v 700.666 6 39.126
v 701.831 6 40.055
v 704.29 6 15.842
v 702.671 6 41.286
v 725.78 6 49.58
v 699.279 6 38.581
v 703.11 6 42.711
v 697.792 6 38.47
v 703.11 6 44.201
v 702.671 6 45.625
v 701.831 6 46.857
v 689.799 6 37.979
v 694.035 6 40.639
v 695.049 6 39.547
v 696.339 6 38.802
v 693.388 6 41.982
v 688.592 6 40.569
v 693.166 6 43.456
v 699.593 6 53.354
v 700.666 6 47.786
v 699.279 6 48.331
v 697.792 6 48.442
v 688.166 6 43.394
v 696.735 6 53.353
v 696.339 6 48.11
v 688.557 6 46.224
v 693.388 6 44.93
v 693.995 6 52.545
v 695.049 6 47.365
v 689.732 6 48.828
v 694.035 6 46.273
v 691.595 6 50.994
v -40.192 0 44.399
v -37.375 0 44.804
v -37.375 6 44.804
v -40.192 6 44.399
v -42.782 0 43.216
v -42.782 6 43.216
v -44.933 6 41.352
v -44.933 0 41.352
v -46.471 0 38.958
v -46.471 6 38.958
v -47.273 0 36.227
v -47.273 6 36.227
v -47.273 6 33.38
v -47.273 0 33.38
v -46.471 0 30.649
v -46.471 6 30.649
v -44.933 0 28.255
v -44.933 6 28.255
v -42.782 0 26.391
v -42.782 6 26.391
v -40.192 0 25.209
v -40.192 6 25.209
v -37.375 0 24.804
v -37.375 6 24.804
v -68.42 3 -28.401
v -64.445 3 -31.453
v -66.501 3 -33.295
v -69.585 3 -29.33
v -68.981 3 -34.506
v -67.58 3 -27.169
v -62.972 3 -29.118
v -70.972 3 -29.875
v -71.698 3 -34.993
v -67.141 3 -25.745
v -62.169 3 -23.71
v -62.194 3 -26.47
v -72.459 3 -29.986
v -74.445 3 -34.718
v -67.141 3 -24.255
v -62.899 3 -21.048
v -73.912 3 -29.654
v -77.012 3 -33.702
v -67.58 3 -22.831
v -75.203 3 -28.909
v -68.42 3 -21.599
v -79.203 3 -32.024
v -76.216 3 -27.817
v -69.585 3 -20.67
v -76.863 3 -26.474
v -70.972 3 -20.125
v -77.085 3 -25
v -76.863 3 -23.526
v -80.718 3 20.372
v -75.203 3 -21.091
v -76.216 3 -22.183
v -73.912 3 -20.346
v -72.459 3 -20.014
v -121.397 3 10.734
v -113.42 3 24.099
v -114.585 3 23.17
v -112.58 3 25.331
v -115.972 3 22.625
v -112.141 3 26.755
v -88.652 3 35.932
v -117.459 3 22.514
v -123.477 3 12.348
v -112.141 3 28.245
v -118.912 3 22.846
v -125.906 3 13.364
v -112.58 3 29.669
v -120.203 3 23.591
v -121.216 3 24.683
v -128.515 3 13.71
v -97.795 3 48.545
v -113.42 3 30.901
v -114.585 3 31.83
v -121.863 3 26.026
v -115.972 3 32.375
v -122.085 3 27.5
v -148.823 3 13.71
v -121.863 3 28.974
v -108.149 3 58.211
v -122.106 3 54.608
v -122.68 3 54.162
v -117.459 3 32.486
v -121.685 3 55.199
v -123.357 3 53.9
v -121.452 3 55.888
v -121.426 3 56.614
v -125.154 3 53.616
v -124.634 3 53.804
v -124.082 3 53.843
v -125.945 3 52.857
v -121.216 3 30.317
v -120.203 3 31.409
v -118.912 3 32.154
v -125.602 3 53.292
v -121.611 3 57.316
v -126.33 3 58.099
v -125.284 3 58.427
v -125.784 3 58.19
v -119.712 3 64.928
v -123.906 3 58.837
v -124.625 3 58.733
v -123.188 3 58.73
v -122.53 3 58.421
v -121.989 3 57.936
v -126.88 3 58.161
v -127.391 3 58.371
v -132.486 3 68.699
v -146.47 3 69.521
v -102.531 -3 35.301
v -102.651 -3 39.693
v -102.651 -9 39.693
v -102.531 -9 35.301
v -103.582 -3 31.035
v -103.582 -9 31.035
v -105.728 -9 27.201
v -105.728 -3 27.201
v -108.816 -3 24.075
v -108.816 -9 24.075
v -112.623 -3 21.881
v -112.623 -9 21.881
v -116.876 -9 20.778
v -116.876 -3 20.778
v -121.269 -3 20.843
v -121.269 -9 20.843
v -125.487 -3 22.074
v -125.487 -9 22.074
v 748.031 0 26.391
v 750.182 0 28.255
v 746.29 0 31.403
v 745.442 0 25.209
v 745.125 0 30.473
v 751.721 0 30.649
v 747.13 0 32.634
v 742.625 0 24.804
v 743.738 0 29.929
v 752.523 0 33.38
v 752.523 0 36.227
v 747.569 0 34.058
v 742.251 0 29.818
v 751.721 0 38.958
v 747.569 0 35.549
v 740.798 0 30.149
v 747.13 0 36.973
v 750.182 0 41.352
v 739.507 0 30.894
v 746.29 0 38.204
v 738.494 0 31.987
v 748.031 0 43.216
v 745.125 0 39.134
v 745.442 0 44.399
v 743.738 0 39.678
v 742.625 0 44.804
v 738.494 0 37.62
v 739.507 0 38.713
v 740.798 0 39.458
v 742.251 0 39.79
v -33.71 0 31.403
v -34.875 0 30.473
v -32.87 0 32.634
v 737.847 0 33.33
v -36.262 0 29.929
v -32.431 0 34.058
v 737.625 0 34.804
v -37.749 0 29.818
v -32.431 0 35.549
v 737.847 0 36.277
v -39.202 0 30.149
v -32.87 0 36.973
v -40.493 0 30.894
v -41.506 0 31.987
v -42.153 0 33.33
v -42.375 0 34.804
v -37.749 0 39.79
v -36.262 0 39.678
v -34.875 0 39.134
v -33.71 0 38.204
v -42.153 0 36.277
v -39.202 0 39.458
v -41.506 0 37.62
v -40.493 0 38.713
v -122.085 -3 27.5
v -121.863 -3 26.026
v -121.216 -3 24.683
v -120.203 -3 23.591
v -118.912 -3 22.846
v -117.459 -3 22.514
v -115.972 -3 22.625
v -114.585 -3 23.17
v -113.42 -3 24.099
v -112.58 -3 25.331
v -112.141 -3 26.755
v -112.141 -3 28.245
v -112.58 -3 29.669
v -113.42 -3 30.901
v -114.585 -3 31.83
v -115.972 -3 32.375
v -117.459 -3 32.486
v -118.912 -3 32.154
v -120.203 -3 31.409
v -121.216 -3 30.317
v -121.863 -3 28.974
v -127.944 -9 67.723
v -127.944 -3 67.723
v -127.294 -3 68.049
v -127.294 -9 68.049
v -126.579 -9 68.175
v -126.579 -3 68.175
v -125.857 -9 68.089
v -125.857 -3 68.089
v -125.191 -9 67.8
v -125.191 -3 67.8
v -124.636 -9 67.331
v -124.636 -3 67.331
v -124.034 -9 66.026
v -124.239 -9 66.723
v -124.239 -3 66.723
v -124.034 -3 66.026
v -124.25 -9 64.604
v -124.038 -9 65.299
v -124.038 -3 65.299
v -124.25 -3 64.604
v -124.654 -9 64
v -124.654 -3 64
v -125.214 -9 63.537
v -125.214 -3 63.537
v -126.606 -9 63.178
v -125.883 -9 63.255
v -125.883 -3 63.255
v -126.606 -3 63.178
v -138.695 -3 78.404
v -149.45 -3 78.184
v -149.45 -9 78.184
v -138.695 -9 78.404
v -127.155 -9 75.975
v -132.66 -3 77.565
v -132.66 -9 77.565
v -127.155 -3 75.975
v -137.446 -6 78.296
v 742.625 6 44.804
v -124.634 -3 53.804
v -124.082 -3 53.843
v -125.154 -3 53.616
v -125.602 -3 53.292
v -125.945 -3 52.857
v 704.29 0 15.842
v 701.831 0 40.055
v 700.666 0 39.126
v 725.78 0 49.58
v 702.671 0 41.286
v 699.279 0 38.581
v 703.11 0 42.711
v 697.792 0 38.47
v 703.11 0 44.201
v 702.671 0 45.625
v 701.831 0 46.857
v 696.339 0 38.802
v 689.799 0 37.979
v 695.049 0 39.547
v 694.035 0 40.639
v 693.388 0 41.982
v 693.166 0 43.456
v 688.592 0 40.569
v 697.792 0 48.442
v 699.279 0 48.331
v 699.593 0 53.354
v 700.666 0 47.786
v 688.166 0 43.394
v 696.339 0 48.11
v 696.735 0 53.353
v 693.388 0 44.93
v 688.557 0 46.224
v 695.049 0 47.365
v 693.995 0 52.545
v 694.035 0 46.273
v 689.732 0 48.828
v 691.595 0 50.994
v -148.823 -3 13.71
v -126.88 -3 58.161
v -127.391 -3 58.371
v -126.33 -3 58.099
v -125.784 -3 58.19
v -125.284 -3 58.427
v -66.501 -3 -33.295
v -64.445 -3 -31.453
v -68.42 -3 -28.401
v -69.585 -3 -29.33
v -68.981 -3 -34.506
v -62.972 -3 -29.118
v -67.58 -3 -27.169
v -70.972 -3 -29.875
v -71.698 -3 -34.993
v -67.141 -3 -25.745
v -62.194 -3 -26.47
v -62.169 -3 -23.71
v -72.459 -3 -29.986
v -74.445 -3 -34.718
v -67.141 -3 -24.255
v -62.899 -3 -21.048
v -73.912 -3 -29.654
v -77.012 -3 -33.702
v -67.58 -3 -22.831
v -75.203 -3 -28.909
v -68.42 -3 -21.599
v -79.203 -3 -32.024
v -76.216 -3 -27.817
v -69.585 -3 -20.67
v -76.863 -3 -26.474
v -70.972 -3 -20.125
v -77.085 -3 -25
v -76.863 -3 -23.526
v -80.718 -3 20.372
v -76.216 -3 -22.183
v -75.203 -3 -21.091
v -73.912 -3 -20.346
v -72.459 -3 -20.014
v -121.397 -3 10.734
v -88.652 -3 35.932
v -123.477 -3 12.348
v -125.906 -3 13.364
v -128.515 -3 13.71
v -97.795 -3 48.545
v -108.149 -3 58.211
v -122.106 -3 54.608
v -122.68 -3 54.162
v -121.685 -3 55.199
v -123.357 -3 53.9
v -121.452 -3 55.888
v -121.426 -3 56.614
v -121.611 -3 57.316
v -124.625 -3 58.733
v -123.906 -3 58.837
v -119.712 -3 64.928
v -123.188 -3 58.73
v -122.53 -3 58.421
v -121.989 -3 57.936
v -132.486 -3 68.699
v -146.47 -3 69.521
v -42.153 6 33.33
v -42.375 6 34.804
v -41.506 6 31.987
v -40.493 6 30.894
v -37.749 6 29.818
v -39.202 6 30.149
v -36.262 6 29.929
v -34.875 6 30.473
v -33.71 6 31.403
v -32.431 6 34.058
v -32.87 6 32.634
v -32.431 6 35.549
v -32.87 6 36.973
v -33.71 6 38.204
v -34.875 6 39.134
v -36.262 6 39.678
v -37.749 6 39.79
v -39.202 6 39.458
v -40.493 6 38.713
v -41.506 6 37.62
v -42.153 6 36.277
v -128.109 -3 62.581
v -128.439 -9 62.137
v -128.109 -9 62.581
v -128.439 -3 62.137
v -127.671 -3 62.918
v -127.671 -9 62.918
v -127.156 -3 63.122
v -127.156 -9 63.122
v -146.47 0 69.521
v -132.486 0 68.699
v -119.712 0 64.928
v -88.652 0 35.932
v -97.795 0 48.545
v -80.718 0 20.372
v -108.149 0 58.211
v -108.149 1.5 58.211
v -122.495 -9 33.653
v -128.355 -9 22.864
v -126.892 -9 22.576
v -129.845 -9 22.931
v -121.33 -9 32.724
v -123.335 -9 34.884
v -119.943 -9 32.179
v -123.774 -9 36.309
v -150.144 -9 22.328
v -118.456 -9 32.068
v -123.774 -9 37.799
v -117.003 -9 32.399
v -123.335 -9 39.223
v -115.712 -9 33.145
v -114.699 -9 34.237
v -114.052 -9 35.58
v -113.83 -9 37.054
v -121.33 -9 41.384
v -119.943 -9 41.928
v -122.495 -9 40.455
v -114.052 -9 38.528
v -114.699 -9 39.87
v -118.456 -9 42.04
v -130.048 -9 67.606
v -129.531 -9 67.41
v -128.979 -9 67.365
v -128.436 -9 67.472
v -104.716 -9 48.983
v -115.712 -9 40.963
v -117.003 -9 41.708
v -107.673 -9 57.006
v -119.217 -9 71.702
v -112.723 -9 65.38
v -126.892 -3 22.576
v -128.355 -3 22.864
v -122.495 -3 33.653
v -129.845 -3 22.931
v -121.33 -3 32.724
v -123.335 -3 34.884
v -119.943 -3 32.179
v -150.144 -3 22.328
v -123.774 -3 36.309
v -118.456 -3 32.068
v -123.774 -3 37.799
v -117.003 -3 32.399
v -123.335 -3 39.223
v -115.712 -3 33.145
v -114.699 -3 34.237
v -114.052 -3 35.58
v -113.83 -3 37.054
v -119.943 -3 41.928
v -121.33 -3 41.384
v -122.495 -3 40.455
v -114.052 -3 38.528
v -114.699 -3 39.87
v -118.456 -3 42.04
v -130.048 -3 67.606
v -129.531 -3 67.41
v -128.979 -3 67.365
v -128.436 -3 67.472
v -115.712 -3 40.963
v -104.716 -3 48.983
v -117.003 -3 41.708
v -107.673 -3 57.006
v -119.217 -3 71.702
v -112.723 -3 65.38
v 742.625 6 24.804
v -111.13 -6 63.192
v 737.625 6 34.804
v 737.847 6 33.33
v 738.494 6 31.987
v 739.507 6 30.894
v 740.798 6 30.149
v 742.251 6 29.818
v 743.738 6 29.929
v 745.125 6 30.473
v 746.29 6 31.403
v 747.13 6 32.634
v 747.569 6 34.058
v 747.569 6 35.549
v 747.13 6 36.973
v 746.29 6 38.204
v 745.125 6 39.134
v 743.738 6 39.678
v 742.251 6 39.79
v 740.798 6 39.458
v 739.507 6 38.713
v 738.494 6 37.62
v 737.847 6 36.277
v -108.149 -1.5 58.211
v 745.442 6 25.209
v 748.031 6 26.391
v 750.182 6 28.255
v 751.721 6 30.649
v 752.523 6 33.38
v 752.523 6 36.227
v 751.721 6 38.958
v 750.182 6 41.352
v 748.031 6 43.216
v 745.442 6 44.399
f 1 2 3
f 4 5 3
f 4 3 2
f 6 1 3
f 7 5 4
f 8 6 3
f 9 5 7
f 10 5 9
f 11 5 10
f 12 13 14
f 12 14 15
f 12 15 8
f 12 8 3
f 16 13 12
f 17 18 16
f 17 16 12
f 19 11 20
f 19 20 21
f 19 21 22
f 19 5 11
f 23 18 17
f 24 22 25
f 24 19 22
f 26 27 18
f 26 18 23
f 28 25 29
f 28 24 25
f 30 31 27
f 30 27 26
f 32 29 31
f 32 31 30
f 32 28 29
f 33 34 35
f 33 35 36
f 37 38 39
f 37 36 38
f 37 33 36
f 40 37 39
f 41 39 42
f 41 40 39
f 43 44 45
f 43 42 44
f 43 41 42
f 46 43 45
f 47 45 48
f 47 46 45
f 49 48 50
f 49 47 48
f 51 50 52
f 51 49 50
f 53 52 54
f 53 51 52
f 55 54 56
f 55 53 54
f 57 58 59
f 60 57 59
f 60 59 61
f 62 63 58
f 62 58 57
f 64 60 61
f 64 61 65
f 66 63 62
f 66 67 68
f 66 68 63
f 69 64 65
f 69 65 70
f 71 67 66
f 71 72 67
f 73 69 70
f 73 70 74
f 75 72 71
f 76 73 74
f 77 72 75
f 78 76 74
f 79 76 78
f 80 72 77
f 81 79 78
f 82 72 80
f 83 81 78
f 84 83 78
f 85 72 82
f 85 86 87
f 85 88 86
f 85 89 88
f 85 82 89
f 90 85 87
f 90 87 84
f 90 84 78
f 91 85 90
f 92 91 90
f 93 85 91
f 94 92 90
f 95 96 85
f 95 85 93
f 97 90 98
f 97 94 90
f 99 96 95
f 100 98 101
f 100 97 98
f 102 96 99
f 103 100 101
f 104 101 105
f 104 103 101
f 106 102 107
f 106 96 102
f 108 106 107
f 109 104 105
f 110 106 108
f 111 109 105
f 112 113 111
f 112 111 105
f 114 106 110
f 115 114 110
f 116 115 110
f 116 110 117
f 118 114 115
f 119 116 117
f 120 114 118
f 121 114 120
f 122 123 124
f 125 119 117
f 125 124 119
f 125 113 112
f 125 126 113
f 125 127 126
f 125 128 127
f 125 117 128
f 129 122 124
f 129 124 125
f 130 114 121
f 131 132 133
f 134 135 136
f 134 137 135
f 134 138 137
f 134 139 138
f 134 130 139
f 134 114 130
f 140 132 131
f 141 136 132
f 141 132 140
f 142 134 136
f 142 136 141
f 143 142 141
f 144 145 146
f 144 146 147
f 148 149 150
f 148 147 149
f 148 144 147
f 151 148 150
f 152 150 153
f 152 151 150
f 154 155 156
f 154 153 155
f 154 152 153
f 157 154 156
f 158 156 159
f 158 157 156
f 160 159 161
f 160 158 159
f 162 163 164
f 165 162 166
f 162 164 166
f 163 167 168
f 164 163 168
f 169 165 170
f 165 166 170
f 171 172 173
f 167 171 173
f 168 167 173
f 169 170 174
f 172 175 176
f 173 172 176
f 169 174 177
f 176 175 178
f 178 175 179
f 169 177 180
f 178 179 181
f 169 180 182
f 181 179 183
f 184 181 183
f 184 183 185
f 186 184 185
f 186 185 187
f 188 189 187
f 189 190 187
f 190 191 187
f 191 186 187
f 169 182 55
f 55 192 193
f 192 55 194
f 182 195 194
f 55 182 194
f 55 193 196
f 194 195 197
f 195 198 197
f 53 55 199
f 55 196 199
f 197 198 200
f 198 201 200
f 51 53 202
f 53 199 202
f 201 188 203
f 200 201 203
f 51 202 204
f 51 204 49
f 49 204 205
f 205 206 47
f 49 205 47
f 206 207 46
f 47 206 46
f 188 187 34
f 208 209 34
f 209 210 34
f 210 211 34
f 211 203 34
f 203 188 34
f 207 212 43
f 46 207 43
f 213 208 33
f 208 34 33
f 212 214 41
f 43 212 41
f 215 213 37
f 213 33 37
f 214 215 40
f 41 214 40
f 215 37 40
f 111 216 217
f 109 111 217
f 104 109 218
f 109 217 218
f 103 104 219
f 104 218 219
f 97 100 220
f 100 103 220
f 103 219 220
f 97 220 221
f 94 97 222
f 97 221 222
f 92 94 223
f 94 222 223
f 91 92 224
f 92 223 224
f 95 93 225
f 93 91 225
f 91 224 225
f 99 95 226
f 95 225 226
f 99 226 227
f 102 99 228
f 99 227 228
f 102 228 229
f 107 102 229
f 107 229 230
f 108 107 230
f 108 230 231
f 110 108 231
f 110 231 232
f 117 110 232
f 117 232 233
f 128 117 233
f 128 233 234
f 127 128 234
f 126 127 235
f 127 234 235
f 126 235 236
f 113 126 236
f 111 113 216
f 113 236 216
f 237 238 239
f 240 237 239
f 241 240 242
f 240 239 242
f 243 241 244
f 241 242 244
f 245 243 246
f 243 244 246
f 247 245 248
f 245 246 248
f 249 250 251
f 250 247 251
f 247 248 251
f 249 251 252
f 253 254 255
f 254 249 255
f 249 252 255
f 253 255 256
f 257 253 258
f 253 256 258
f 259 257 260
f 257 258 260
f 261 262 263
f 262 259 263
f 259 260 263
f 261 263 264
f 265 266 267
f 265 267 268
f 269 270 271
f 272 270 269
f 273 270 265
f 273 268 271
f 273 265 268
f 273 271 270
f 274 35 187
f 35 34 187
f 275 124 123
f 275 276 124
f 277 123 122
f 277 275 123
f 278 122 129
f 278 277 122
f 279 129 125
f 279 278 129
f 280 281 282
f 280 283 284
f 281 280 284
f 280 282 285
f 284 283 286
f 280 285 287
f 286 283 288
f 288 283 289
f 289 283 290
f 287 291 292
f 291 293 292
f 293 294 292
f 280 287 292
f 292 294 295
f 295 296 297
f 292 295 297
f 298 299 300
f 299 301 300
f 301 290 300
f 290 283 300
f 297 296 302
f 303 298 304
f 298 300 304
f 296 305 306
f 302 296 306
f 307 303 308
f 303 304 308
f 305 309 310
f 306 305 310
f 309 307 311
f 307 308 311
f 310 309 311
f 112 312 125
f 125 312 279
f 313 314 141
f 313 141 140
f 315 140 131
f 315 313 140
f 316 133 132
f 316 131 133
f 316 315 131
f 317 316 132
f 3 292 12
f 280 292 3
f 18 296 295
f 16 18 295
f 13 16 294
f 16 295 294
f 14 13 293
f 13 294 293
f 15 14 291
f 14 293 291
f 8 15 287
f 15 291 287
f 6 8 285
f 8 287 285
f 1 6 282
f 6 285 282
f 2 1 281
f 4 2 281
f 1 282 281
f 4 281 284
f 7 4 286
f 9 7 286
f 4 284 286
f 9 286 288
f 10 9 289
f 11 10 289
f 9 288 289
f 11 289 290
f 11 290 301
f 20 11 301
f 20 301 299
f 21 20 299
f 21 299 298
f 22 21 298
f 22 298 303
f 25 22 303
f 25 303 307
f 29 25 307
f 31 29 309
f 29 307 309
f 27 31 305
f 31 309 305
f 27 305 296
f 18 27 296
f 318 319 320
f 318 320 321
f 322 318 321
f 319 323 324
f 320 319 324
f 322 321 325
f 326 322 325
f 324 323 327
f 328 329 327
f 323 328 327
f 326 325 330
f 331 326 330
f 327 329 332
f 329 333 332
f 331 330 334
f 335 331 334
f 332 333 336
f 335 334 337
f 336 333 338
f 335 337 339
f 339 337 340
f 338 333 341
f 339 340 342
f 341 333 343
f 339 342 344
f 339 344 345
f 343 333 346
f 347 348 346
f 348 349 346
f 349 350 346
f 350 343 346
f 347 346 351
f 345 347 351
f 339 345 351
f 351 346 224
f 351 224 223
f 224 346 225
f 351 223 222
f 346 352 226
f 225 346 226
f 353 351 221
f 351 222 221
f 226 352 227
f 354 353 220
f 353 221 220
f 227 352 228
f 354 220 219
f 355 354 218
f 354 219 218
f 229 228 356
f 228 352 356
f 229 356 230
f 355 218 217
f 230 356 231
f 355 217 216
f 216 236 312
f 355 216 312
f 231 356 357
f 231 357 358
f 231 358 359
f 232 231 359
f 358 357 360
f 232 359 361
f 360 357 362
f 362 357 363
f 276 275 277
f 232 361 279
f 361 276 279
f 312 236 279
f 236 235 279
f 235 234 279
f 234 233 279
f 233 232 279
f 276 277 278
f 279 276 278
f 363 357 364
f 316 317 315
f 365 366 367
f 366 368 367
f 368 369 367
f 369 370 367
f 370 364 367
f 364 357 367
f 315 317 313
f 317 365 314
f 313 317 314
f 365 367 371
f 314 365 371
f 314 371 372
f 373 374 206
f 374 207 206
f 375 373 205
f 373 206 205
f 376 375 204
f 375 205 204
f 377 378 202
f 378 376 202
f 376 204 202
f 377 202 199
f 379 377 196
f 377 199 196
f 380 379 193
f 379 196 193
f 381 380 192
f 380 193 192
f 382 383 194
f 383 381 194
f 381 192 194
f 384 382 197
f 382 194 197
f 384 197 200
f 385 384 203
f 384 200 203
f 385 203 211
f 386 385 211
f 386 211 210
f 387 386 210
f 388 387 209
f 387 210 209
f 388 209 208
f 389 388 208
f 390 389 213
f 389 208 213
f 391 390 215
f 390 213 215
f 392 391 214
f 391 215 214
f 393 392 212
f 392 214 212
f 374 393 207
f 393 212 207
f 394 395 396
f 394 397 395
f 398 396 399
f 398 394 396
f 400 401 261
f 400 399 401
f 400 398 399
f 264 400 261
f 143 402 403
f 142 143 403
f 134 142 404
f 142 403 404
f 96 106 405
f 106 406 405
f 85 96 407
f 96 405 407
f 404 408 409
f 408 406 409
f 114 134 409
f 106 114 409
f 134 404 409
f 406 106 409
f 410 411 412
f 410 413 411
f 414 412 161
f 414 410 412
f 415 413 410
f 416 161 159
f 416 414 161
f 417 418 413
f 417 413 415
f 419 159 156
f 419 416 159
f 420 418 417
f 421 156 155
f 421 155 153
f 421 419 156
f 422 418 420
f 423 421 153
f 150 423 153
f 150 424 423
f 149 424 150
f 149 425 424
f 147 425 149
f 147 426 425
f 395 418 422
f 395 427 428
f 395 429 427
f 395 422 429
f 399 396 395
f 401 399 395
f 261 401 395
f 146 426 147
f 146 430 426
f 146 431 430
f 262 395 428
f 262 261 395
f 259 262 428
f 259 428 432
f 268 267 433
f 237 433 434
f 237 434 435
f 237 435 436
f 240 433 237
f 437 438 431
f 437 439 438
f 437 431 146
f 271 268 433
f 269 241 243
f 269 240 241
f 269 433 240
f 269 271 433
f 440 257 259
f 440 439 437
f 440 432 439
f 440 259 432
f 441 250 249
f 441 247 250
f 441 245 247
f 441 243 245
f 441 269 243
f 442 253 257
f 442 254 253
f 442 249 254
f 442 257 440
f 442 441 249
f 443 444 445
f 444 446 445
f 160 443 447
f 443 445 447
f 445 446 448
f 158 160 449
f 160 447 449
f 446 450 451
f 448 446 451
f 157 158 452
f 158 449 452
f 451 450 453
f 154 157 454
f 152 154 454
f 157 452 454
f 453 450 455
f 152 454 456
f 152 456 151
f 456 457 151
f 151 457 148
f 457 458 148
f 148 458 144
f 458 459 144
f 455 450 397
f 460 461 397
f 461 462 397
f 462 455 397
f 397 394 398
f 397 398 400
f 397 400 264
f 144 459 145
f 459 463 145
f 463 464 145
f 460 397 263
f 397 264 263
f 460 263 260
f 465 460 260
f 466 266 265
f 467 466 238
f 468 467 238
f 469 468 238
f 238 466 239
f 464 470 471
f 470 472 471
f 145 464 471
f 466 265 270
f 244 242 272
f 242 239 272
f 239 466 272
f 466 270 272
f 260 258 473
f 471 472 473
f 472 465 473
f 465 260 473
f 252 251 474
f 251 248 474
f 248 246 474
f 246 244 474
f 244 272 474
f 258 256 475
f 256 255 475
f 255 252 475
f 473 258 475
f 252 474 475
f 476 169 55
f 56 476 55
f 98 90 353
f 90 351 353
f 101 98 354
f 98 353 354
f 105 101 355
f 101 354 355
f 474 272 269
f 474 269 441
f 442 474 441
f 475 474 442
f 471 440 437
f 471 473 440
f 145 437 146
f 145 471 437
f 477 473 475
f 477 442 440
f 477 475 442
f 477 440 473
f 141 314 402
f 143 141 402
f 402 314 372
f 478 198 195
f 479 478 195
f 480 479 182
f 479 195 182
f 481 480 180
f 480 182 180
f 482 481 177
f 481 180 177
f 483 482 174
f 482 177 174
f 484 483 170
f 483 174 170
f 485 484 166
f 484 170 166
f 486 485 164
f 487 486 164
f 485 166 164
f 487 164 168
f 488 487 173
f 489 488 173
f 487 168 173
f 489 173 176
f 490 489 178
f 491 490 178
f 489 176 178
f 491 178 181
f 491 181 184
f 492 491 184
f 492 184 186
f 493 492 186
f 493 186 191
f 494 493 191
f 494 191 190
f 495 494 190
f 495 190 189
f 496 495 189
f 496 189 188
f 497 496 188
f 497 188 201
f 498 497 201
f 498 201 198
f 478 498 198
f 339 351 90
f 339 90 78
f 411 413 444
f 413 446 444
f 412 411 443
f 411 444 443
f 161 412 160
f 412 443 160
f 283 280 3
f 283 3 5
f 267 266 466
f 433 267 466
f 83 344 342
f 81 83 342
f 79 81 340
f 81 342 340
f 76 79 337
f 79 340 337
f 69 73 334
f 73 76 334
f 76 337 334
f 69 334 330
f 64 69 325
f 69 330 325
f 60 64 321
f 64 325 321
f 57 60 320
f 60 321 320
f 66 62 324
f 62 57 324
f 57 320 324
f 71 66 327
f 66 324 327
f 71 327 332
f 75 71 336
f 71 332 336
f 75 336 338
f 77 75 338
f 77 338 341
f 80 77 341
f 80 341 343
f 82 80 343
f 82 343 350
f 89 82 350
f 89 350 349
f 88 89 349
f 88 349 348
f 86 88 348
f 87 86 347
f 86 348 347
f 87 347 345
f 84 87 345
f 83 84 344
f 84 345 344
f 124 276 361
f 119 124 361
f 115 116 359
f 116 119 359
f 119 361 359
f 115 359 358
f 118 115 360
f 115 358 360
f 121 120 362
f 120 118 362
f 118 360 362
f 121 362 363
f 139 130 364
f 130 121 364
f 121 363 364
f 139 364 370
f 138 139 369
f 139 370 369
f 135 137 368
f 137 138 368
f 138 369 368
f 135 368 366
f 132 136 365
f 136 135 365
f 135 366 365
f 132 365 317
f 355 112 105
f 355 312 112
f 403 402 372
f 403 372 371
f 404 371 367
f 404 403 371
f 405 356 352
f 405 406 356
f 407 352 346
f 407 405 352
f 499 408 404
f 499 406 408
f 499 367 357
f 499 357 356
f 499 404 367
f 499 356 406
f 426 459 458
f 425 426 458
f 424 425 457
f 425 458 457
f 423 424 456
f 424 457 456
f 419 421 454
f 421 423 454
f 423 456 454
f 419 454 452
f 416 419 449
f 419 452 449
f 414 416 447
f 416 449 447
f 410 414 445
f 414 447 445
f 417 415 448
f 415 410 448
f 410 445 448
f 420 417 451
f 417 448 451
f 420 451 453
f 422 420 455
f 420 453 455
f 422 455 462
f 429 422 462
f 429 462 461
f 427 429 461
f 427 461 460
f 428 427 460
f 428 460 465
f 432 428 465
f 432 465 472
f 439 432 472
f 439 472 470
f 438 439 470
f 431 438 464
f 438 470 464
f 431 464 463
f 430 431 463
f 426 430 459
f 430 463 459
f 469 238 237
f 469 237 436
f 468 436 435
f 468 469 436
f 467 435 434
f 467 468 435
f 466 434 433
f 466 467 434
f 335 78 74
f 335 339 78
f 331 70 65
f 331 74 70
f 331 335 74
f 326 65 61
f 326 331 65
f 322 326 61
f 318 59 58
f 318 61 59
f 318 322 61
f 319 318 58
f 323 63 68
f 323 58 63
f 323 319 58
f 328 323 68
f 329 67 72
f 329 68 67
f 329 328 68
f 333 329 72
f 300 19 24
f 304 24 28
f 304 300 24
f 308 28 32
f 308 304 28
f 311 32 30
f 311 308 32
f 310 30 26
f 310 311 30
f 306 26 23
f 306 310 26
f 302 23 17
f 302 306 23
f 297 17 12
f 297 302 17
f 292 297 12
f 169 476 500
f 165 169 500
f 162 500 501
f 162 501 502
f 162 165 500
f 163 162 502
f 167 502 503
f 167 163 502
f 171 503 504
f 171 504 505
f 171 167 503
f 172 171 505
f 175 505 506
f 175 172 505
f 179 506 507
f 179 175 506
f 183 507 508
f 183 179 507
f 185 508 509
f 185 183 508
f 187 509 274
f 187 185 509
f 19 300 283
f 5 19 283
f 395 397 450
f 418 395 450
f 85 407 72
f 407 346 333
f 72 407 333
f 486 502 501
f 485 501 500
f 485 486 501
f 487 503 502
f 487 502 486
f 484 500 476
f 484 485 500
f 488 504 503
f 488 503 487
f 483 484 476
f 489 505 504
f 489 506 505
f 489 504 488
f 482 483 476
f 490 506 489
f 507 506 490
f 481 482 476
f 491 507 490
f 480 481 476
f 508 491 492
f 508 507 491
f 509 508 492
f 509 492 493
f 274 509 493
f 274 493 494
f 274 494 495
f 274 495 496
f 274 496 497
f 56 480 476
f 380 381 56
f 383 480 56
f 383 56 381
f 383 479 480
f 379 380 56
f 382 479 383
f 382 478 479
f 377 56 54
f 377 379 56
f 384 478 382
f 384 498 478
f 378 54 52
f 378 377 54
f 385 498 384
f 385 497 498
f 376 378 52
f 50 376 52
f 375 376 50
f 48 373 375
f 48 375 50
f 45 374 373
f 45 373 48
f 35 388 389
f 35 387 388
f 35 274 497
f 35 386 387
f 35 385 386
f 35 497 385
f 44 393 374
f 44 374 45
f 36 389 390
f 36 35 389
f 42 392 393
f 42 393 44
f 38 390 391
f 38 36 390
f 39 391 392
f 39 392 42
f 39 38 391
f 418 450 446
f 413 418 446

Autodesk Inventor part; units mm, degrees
ref_plane "YZ Plane" through (0, 0, 0) normal (1, 0, 0) x (0, 1, 0)
ref_plane "XZ Plane" through (0, 0, 0) normal (0, 1, 0) x (-1, 0, 0)
ref_plane "XY Plane" through (0, 0, 0) normal (0, 0, 1) x (1, 0, 0)
sketch "Sketch1" plane through (0, 0, 0) normal (0, 1, 0) x (-1, 0, 0)
  line L0 (-32.0851, 0) -> (32.0851, 0)
  circle A0 centre (-707.9149, -25) radius 9.525 construction
  circle A1 centre (-708.1649, 701) radius 16.5354 construction
  line L1 (-708.1649, 701) -> (-707.9149, -25) construction
  line L2 (-707.9149, -25) -> (-1097.9553, 587.3271)
  circle A2 centre (-707.9149, -25) radius 726 construction
  line L3 (-729.0005, -38.4311) -> (-1119.041, 573.896) construction
  line L4 (-1119.041, 573.896) -> (-1076.8697, 600.7583) construction
  line L5 (-1076.8697, 600.7583) -> (-686.8292, -11.5689) construction
  line L6 (-686.8292, -11.5689) -> (-729.0005, -38.4311) construction
  line L7 (-729.0005, -38.4311) -> (-1076.8697, 600.7583) construction
  line L8 (-1119.041, 573.896) -> (-686.8292, -11.5689) construction
  line L9 (-1433.9063, -50.25) -> (-1433.9235, -0.25) construction
  line L10 (-707.9235, 0) -> (-707.9063, -50) construction
  circle A3 centre (-707.9149, -25) radius 52.5 construction
  line L11 (-689.7993, 37.979) -> (-704.2897, 15.8425)
  line L12 (-699.5926, 53.3536) -> (-725.7796, 49.5795)
  arc A4 (-689.7993, 37.979) -> (-699.5926, 53.3536) centre (-698.1661, 43.4559) ccw
  circle A5 centre (-698.1661, 43.4559) radius 5
  line L13 (-698.1661, 43.4559) -> (-736.1203, 19.2799) construction
  circle A6 centre (72.0851, -25) radius 5
  arc A7 (62.8991, -21.0481) -> (80.3122, -19.3154) centre (72.0851, -25) ccw
  circle A8 centre (72.0851, -25) radius 87.2511 construction
  line L14 (176.9747, 84.4532) -> (127.3309, 55.4404) construction
  circle A9 centre (72.0851, -25) radius 151.5976 construction
  circle A10 centre (-707.9149, -25) radius 69.1466 construction
  line L15 (-707.9387, 44.1466) -> (-777.0615, -25) construction
  line L16 (80.7183, 20.3721) -> (62.8991, -21.0481)
  line L17 (-707.933, 27.5) -> (-662.933, 27.5155) construction
  circle A11 centre (72.0851, -25) radius 52.5 construction
  circle A12 centre (72.0851, -25) radius 69.1466 construction
  line L18 (72.0851, 27.5) -> (117.0851, 27.5) construction
  circle A13 centre (117.0851, 27.5) radius 5
  arc A14 (125.2839, 58.4267) -> (124.0817, 53.8433) centre (123.911, 56.3374) ccw
  line L19 (148.823, 13.7104) -> (125.945, 52.8571)
  arc A15 (125.2839, 58.4267) -> (127.3914, 58.3714) centre (126.3822, 60.0981) ccw
  arc A16 (125.945, 52.8571) -> (124.0817, 53.8433) centre (124.2183, 51.8479) ccw
  line L20 (-704.2897, 15.8425) -> (-725.7796, 49.5795)
  line L21 (148.823, 13.7104) -> (128.5153, 13.7104)
  line L22 (121.3974, 10.7344) -> (79.203, -32.024)
  arc A17 (128.5153, 13.7104) -> (121.3974, 10.7344) centre (128.5153, 3.7104) ccw
  line L23 (123.911, 56.3374) -> (175.7133, 86.6116) construction
  line L24 (154.1852, 4.5352) -> (123.911, 56.3374) construction
  line L25 (117.0851, 27.5) -> (-662.933, 27.5155) construction
  line L26 (117.0853, 37.5) -> (-662.9328, 37.5155) construction
  line L27 (-662.9332, 17.5155) -> (117.0849, 17.5) construction
  arc A18 (117.0849, 17.5) -> (117.0853, 37.5) centre (117.0851, 27.5) ccw construction
  arc A19 (-662.9328, 37.5155) -> (-662.9332, 17.5155) centre (-662.933, 27.5155) ccw construction
  line L28 (-732.9149, -5) -> (367.0851, -5) construction
  line L29 (-732.9149, 0) -> (367.0851, 0) construction
  line L30 (-742.6249, -64.3887) -> (-742.6249, 34.8036) construction
  line L31 (37.3751, 14.3887) -> (37.3751, 34.8036) construction
  line L32 (37.3751, 34.8036) -> (-742.6249, 34.8036) construction
  line L33 (37.3751, 44.8036) -> (-742.6249, 44.8036)
  line L34 (-742.6249, 24.8036) -> (37.3751, 24.8036)
  arc A20 (37.3751, 24.8036) -> (37.3751, 44.8036) centre (37.3751, 34.8036) ccw
  arc A21 (-742.6249, 44.8036) -> (-742.6249, 24.8036) centre (-742.6249, 34.8036) ccw
  line L35 (146.4702, 69.5214) -> (102.7028, 71.4745) construction
  line L36 (102.7028, 71.4745) -> (80.7183, 20.3721) construction
  spline S0 degree 2 poles (146.4702, 69.5214) (102.7028, 71.4745) (80.7183, 20.3721) knots 1 1 1 2 2 2
  line L37 (127.3914, 58.3714) -> (146.4702, 69.5214)
  circle A22 centre (37.3751, 34.8036) radius 5
  circle A23 centre (-742.6249, 34.8036) radius 5
  point P0 (0, 0)
  point P1 (0, 0)
  point P2 (-902.9351, 281.1636)
  point P3 (-707.9149, -25)
  point P4 (126.0694, 57.5988)
  point P5 (130.1781, 60)
  point P6 (125.1724, 54.179)
  point P7 (132.8635, 61.5694)
  point P8 (-272.9239, 27.5077)
  point P9 (-352.6249, 34.8036)
  dimension "d8" = 50
  dimension "d9" = 50
  dimension "d10" = 105
  dimension "d13" = 10
  dimension "d14" = 20
  dimension "d15" = 20
  dimension "d16" = 40
  dimension "d17" = 10
  dimension "d18" = 780
  dimension "d19" = 20
  dimension "d23" = 45
  dimension "d24" = 10
  dimension "d26" = 5
  dimension "d27" = 2
  dimension "d28" = 45
  dimension "d31" = 69.1466
  dimension "d32" = 10
  dimension "d33" = 20
  dimension "d34" = 20
  dimension "d35" = 780
  dimension "d36" = 10
  dimension "d37" = 10
extrude "Extrusion1" add sketch "Sketch1" along normal mid plane 6 contours L16 S0 L37 A15 A14 A16 L19 L21 A17 L22 A7
extrude "Extrusion3" add sketch "Sketch1" along normal blind 6 separate body contours L34 L11 L20 | L20 L33 A5 A4 L11 L34 | L20 L12 A4 L33 A5
extrude "Extrusion4" add sketch "Sketch1" along normal blind 6 separate body contours L34 A21 L2 A23 | L2 A23 A21 L33 L20 L34 | L20 L33 A5 A4 L11 L34 | L11 A4 L33 A20 L34 | L33 A5 picked at (-699.4866, 42.0247)
sketch "Sketch3" plane through (0, -3, 0) normal (0, -1, 0) x (1, 0, 0)
  circle A0 centre (-118.8299, 37.0538) radius 5 projected
  circle A1 centre (-72.2906, -14.0866) radius 5 projected
  line L0 (-63.226, -9.8637) -> (-82.2675, 31.0091) projected
  spline S0 degree 2 poles (-82.2675, 31.0091) (-105.7599, 81.436) (-149.45, 78.184) knots 1 1 1 2 2 2 projected
  line L1 (-149.45, 78.184) -> (-130.0484, 67.6055) projected
  arc A2 (-130.0484, 67.6055) -> (-127.9435, 67.7234) centre (-129.091, 69.3615) ccw projected
  arc A3 (-126.6058, 63.1776) -> (-127.9435, 67.7234) centre (-126.5092, 65.6758) ccw projected
  arc A4 (-126.6058, 63.1776) -> (-128.4389, 62.1366) centre (-126.683, 61.1791) ccw projected
  line L2 (-128.4389, 62.1366) -> (-150.1443, 22.3278) projected
  line L3 (-150.1443, 22.3278) -> (-129.8455, 22.9309) projected
  arc A5 (-122.6424, 20.1675) -> (-129.8455, 22.9309) centre (-129.5485, 12.9353) ccw projected
  line L4 (-122.6424, 20.1675) -> (-79.1967, -21.3189) projected
  arc A6 (-79.1967, -21.3189) -> (-63.226, -9.8637) centre (-72.2906, -14.0866) ccw projected
  arc A7 (-125.4874, 22.0735) -> (-102.6507, 39.693) centre (-118.8299, 37.0538) ccw
  line L5 (-149.45, 78.184) -> (-109.6014, 82.3028) construction
  line L6 (-109.6014, 82.3028) -> (-102.6507, 39.693) construction
  spline S1 degree 2 poles (-149.45, 78.184) (-109.6014, 82.3028) (-102.6507, 39.693) knots 1 1 1 2 2 2
  point P0 (0, 0)
extrude "Extrusion5" add sketch "Sketch3" along normal blind 6 separate body contours S1 A7 A5 L3 L2 A4 A3 A2 L1 S0 | S0 S1
properties part number "Soporte freno"
